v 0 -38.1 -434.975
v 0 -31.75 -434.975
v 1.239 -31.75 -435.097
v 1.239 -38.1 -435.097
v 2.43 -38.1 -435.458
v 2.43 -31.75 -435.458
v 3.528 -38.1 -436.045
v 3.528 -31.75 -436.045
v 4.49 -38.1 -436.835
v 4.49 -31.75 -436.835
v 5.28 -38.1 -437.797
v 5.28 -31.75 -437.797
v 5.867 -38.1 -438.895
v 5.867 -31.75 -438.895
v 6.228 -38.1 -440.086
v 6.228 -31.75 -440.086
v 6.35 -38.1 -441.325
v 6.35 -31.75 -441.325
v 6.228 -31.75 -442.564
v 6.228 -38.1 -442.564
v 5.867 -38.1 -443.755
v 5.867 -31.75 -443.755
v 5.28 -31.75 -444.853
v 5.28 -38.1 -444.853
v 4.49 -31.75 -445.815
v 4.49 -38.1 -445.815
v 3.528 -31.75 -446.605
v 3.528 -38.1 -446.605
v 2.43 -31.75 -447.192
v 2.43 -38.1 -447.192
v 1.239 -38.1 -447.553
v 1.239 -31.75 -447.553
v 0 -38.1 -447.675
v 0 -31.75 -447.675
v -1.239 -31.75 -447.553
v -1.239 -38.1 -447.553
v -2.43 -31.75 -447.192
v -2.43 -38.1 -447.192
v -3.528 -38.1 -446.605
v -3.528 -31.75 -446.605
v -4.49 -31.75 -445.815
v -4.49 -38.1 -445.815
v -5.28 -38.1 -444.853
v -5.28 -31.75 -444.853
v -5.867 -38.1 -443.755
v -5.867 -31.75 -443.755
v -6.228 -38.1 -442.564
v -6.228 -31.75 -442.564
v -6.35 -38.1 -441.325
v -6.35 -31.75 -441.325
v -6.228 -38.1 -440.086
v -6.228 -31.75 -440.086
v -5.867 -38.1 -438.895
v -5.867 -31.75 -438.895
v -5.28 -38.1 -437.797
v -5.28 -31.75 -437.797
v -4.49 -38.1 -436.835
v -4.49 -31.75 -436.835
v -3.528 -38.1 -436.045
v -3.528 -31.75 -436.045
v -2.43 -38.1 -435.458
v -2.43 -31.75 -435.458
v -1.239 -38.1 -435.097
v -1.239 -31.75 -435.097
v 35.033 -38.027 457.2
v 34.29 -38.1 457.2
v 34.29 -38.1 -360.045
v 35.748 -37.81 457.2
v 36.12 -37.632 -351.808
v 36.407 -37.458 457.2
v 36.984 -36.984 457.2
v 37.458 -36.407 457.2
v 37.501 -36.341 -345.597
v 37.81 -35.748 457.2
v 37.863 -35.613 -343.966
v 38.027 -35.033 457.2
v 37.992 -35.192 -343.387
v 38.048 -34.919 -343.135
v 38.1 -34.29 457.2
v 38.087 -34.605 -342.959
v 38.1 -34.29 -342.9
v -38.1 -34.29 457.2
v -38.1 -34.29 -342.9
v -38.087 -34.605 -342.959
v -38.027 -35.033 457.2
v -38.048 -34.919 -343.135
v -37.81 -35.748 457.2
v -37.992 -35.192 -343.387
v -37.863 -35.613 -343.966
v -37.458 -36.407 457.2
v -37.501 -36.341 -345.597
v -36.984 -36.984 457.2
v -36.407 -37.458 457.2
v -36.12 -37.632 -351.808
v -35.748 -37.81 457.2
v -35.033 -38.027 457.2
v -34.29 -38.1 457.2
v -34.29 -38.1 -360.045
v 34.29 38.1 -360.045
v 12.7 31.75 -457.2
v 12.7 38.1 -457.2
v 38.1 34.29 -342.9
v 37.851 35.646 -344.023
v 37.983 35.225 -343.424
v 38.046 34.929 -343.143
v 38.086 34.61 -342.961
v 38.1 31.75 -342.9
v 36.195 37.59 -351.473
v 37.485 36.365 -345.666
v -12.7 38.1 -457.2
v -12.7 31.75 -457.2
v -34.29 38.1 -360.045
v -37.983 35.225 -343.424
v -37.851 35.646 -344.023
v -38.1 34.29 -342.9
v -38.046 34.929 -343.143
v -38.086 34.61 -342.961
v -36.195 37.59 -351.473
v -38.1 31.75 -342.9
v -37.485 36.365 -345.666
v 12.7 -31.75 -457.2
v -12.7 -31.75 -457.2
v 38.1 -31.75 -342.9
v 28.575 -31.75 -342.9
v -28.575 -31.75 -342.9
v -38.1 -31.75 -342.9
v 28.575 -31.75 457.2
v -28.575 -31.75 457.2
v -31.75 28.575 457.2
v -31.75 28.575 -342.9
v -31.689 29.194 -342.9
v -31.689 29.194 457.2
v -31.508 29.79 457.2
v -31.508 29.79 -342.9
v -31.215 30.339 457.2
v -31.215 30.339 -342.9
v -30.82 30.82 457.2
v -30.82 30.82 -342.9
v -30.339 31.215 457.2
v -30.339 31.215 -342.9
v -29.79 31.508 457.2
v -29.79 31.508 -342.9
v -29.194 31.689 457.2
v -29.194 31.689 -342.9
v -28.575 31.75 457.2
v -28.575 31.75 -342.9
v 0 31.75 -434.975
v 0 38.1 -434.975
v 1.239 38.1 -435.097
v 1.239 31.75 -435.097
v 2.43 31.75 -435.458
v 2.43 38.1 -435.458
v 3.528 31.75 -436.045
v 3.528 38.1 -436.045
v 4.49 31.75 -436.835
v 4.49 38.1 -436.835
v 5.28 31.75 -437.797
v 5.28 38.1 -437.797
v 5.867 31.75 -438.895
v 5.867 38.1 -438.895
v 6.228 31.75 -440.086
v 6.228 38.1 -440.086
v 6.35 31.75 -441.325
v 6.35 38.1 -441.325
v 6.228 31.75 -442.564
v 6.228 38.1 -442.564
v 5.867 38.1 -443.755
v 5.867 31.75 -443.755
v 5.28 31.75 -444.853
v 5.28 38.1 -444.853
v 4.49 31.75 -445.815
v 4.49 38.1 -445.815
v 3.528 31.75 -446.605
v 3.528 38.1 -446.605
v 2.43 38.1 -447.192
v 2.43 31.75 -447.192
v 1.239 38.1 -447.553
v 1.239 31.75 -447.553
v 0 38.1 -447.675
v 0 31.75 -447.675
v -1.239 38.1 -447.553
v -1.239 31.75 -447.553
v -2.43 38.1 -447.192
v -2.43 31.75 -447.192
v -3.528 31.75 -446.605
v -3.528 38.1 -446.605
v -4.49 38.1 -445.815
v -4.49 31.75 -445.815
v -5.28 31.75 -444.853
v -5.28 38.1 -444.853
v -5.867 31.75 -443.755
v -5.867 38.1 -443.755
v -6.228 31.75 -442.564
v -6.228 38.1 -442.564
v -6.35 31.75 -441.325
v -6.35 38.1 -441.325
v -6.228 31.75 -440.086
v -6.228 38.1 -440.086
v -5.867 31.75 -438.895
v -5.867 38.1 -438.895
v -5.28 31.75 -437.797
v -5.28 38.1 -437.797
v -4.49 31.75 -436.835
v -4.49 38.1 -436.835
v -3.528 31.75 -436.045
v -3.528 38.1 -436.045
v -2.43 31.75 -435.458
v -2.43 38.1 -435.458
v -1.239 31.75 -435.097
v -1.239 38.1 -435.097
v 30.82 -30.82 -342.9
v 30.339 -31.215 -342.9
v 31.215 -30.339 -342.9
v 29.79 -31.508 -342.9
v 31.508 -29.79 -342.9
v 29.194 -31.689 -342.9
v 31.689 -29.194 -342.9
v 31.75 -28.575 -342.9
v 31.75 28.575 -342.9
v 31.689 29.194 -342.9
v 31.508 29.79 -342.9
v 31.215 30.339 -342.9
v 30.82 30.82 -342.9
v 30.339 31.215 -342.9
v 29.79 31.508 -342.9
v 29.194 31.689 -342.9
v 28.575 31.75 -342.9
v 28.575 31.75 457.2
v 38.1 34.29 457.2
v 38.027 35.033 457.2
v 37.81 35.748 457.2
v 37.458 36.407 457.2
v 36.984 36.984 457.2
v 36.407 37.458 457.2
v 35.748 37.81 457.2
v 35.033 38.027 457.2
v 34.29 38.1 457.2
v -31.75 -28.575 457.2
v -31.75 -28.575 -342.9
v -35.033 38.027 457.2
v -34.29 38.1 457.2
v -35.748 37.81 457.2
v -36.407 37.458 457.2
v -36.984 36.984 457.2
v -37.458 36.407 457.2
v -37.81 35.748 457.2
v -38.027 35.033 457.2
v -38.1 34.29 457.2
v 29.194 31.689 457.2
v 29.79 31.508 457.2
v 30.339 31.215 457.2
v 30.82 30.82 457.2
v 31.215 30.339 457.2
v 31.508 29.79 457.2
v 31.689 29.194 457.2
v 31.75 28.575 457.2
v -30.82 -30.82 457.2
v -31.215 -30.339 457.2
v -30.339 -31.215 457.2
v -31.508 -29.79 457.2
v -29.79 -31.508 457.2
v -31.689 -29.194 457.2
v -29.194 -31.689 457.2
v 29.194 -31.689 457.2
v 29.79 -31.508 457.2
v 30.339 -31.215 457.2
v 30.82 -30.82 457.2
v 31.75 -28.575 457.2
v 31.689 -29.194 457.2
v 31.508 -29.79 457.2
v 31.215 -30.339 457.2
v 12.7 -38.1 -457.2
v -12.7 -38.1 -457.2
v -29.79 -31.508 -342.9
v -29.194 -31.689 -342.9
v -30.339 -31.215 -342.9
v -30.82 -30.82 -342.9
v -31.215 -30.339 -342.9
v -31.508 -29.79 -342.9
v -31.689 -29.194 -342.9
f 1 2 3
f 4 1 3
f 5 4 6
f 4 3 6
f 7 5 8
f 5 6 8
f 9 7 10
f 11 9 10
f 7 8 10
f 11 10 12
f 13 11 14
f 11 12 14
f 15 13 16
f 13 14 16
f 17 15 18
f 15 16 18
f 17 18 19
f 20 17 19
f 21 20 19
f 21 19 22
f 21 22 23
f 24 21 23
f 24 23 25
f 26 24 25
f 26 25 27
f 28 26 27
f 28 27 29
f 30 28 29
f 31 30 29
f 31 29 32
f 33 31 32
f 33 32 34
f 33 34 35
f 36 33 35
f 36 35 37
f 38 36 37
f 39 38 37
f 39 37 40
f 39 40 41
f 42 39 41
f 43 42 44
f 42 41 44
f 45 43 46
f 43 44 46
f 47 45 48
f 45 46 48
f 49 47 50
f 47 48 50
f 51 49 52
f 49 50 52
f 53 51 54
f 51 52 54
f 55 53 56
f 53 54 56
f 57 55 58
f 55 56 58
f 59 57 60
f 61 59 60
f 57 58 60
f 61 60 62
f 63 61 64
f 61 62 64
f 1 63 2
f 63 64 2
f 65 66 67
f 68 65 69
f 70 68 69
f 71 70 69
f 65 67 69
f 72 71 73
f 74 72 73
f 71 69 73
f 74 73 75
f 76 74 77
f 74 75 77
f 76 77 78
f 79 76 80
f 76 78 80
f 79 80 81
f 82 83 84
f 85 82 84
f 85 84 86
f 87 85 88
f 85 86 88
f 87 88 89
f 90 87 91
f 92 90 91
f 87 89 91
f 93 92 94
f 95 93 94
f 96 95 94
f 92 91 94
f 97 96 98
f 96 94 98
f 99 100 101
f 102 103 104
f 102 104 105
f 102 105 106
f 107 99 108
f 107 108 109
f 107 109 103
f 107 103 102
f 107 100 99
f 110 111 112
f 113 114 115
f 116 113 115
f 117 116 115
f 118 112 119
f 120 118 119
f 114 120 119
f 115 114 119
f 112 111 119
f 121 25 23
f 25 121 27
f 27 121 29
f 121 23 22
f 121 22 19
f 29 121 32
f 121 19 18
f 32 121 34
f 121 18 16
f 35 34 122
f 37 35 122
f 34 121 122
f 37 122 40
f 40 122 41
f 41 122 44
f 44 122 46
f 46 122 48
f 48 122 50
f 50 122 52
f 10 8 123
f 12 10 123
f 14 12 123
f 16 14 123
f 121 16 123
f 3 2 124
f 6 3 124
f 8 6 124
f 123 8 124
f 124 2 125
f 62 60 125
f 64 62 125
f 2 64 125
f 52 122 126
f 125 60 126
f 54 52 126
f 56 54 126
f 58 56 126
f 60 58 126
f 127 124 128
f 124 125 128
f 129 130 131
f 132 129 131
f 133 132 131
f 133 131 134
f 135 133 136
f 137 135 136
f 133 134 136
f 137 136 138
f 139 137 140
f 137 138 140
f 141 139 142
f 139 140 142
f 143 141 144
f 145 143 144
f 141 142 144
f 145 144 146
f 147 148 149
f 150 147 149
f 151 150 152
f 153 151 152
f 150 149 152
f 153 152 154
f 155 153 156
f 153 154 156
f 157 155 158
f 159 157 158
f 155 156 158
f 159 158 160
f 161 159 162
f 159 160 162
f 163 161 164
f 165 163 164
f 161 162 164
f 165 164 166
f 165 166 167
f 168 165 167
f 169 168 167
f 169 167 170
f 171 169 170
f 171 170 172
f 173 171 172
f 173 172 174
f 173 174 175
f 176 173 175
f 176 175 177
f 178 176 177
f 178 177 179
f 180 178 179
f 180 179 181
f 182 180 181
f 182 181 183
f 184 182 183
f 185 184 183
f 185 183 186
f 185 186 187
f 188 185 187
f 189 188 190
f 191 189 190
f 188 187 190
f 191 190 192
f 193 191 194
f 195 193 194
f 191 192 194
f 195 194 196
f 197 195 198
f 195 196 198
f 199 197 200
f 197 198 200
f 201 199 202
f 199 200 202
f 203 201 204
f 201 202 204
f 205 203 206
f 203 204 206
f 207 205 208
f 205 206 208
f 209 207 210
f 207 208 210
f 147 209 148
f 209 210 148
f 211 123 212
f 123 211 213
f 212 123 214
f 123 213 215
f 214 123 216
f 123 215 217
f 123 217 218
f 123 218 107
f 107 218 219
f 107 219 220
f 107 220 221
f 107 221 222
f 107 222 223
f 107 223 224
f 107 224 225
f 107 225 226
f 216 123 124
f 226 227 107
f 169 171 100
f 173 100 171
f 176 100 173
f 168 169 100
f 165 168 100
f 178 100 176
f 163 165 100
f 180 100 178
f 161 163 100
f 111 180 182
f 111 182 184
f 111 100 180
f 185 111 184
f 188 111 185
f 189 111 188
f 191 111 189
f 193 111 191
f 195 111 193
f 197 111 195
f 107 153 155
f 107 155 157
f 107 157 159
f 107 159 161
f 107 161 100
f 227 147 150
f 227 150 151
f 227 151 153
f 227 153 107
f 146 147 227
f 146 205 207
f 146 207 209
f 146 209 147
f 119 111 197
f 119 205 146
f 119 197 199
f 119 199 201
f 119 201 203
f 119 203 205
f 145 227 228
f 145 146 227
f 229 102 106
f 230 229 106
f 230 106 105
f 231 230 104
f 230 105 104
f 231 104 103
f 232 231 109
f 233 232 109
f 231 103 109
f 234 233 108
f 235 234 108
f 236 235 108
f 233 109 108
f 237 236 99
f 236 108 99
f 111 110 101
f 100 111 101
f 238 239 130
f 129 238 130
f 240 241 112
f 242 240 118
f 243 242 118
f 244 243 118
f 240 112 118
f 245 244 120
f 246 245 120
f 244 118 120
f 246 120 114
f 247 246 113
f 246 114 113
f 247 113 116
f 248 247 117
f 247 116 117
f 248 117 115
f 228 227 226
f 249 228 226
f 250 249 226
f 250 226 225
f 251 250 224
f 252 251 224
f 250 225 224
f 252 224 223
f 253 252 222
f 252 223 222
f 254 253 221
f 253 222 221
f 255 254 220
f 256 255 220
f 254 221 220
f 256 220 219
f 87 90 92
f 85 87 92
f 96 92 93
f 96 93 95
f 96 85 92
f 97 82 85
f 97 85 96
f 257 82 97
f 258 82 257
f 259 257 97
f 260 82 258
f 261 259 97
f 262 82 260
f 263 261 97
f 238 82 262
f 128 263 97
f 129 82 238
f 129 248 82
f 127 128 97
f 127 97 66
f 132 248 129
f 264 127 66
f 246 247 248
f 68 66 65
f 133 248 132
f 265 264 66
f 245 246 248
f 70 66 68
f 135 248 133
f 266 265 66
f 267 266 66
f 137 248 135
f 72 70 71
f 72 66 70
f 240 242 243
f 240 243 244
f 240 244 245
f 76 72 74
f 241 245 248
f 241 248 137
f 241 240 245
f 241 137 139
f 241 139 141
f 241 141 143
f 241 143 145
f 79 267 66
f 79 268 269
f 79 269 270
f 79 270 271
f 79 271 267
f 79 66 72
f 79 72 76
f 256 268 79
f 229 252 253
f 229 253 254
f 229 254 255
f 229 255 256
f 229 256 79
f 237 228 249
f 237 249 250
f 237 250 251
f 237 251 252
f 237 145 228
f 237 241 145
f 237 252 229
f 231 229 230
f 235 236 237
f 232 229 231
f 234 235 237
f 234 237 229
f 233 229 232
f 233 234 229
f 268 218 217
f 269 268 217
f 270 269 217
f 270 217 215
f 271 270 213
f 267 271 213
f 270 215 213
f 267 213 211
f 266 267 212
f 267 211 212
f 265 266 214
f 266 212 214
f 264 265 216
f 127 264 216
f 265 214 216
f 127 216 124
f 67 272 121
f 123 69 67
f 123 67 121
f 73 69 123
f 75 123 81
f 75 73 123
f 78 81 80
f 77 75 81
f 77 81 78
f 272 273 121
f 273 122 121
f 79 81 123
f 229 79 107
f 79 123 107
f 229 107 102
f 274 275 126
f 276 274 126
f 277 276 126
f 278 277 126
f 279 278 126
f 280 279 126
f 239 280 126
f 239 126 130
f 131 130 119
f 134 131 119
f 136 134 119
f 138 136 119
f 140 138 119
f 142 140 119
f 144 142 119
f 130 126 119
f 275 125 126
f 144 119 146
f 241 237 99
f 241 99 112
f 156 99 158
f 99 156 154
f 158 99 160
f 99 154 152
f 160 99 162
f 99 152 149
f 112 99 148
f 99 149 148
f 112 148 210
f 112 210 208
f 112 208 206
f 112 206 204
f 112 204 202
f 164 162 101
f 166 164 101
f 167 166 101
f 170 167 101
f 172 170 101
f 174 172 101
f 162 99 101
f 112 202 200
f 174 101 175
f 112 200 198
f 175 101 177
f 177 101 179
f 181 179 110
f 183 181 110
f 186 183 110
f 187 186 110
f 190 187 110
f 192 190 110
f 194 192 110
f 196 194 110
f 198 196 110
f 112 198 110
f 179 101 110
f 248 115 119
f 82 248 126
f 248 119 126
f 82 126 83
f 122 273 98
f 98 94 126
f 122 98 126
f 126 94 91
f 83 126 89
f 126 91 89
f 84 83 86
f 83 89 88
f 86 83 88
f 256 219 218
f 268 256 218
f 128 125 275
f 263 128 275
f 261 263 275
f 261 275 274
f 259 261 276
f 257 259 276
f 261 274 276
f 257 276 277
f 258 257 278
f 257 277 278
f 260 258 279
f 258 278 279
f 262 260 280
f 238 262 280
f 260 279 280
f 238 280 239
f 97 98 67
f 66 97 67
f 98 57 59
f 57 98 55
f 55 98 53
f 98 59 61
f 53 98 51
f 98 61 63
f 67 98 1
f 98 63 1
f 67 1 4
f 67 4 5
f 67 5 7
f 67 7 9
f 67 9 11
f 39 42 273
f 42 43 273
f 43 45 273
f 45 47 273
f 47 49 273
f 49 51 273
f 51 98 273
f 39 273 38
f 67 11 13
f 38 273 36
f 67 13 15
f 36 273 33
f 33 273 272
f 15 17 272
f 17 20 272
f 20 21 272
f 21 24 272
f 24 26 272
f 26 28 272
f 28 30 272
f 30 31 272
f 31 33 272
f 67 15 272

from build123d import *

# Parameters (mm, degrees)
BOSS_EXTRUDE1_DEPTH      = 457.2
BOSS_EXTRUDE1_DEPTH_BACK = 457.2
SKETCH6_W                = 114.3
SKETCH6_H                = 63.5
SIDE_CUT_DEPTH           = 466.069768959
TRIANGLE_CUT_DEPTH       = 466.069768959
SKETCH8_R                = 6.35
CUT_EXTRUDE4_DEPTH       = 466.069768959


with BuildPart() as part:
    # Sketch4 → Boss-Extrude1 (new, two sides: drawn at the far end of the back side and taken through both)
    with BuildSketch(Plane.XY.offset(-BOSS_EXTRUDE1_DEPTH_BACK)):
        with BuildLine():
            Line((38.1, -34.29), (38.1, 34.29))
            ThreePointArc((38.1, 34.29), (36.984076836, 36.984076836), (34.29, 38.1))
            Line((34.29, 38.1), (-34.29, 38.1))
            ThreePointArc((-34.29, 38.1), (-36.984076836, 36.984076836), (-38.1, 34.29))
            Line((-38.1, 34.29), (-38.1, -34.29))
            ThreePointArc((-38.1, -34.29), (-36.984076836, -36.984076836), (-34.29, -38.1))
            Line((-34.29, -38.1), (34.29, -38.1))
            ThreePointArc((34.29, -38.1), (36.984076836, -36.984076836), (38.1, -34.29))
        make_face()
        with BuildLine():
            Line((31.75, 28.575), (31.75, -28.575))
            ThreePointArc((31.75, -28.575), (30.82006403, -30.82006403), (28.575, -31.75))
            Line((28.575, -31.75), (-28.575, -31.75))
            ThreePointArc((-28.575, -31.75), (-30.82006403, -30.82006403), (-31.75, -28.575))
            Line((-31.75, -28.575), (-31.75, 28.575))
            ThreePointArc((-31.75, 28.575), (-30.82006403, 30.82006403), (-28.575, 31.75))
            Line((-28.575, 31.75), (28.575, 31.75))
            ThreePointArc((28.575, 31.75), (30.82006403, 30.82006403), (31.75, 28.575))
        make_face(mode=Mode.SUBTRACT)
    extrude(amount=BOSS_EXTRUDE1_DEPTH + BOSS_EXTRUDE1_DEPTH_BACK)

    # Sketch6 → side cut (cut, through all)
    with BuildSketch(Plane.ZY.offset(38.1)):
        with Locations((-400.05, 0)):
            Rectangle(SKETCH6_W, SKETCH6_H)
    extrude(amount=-SIDE_CUT_DEPTH, mode=Mode.SUBTRACT)

    # Sketch7 → triangle cut (cut, through all)
    with BuildSketch(Plane.XZ.offset(38.1)):
        Polygon((-38.1, -342.9), (-38.1, -457.2), (-12.7, -457.2), align=None)
        Polygon((12.7, -457.2), (38.1, -342.9), (38.1, -457.2), align=None)
    extrude(amount=-TRIANGLE_CUT_DEPTH, mode=Mode.SUBTRACT)

    # Sketch8 → Cut-Extrude4 (cut, through all)
    with BuildSketch(Plane(origin=(0, 38.1, 0), x_dir=(1, 0, 0), z_dir=(0, 1, 0))):
        with Locations(Location((0, 441.325, 0), (0, 0, 270))):
            Circle(SKETCH8_R)
    extrude(amount=-CUT_EXTRUDE4_DEPTH, mode=Mode.SUBTRACT)


solid = part.part
